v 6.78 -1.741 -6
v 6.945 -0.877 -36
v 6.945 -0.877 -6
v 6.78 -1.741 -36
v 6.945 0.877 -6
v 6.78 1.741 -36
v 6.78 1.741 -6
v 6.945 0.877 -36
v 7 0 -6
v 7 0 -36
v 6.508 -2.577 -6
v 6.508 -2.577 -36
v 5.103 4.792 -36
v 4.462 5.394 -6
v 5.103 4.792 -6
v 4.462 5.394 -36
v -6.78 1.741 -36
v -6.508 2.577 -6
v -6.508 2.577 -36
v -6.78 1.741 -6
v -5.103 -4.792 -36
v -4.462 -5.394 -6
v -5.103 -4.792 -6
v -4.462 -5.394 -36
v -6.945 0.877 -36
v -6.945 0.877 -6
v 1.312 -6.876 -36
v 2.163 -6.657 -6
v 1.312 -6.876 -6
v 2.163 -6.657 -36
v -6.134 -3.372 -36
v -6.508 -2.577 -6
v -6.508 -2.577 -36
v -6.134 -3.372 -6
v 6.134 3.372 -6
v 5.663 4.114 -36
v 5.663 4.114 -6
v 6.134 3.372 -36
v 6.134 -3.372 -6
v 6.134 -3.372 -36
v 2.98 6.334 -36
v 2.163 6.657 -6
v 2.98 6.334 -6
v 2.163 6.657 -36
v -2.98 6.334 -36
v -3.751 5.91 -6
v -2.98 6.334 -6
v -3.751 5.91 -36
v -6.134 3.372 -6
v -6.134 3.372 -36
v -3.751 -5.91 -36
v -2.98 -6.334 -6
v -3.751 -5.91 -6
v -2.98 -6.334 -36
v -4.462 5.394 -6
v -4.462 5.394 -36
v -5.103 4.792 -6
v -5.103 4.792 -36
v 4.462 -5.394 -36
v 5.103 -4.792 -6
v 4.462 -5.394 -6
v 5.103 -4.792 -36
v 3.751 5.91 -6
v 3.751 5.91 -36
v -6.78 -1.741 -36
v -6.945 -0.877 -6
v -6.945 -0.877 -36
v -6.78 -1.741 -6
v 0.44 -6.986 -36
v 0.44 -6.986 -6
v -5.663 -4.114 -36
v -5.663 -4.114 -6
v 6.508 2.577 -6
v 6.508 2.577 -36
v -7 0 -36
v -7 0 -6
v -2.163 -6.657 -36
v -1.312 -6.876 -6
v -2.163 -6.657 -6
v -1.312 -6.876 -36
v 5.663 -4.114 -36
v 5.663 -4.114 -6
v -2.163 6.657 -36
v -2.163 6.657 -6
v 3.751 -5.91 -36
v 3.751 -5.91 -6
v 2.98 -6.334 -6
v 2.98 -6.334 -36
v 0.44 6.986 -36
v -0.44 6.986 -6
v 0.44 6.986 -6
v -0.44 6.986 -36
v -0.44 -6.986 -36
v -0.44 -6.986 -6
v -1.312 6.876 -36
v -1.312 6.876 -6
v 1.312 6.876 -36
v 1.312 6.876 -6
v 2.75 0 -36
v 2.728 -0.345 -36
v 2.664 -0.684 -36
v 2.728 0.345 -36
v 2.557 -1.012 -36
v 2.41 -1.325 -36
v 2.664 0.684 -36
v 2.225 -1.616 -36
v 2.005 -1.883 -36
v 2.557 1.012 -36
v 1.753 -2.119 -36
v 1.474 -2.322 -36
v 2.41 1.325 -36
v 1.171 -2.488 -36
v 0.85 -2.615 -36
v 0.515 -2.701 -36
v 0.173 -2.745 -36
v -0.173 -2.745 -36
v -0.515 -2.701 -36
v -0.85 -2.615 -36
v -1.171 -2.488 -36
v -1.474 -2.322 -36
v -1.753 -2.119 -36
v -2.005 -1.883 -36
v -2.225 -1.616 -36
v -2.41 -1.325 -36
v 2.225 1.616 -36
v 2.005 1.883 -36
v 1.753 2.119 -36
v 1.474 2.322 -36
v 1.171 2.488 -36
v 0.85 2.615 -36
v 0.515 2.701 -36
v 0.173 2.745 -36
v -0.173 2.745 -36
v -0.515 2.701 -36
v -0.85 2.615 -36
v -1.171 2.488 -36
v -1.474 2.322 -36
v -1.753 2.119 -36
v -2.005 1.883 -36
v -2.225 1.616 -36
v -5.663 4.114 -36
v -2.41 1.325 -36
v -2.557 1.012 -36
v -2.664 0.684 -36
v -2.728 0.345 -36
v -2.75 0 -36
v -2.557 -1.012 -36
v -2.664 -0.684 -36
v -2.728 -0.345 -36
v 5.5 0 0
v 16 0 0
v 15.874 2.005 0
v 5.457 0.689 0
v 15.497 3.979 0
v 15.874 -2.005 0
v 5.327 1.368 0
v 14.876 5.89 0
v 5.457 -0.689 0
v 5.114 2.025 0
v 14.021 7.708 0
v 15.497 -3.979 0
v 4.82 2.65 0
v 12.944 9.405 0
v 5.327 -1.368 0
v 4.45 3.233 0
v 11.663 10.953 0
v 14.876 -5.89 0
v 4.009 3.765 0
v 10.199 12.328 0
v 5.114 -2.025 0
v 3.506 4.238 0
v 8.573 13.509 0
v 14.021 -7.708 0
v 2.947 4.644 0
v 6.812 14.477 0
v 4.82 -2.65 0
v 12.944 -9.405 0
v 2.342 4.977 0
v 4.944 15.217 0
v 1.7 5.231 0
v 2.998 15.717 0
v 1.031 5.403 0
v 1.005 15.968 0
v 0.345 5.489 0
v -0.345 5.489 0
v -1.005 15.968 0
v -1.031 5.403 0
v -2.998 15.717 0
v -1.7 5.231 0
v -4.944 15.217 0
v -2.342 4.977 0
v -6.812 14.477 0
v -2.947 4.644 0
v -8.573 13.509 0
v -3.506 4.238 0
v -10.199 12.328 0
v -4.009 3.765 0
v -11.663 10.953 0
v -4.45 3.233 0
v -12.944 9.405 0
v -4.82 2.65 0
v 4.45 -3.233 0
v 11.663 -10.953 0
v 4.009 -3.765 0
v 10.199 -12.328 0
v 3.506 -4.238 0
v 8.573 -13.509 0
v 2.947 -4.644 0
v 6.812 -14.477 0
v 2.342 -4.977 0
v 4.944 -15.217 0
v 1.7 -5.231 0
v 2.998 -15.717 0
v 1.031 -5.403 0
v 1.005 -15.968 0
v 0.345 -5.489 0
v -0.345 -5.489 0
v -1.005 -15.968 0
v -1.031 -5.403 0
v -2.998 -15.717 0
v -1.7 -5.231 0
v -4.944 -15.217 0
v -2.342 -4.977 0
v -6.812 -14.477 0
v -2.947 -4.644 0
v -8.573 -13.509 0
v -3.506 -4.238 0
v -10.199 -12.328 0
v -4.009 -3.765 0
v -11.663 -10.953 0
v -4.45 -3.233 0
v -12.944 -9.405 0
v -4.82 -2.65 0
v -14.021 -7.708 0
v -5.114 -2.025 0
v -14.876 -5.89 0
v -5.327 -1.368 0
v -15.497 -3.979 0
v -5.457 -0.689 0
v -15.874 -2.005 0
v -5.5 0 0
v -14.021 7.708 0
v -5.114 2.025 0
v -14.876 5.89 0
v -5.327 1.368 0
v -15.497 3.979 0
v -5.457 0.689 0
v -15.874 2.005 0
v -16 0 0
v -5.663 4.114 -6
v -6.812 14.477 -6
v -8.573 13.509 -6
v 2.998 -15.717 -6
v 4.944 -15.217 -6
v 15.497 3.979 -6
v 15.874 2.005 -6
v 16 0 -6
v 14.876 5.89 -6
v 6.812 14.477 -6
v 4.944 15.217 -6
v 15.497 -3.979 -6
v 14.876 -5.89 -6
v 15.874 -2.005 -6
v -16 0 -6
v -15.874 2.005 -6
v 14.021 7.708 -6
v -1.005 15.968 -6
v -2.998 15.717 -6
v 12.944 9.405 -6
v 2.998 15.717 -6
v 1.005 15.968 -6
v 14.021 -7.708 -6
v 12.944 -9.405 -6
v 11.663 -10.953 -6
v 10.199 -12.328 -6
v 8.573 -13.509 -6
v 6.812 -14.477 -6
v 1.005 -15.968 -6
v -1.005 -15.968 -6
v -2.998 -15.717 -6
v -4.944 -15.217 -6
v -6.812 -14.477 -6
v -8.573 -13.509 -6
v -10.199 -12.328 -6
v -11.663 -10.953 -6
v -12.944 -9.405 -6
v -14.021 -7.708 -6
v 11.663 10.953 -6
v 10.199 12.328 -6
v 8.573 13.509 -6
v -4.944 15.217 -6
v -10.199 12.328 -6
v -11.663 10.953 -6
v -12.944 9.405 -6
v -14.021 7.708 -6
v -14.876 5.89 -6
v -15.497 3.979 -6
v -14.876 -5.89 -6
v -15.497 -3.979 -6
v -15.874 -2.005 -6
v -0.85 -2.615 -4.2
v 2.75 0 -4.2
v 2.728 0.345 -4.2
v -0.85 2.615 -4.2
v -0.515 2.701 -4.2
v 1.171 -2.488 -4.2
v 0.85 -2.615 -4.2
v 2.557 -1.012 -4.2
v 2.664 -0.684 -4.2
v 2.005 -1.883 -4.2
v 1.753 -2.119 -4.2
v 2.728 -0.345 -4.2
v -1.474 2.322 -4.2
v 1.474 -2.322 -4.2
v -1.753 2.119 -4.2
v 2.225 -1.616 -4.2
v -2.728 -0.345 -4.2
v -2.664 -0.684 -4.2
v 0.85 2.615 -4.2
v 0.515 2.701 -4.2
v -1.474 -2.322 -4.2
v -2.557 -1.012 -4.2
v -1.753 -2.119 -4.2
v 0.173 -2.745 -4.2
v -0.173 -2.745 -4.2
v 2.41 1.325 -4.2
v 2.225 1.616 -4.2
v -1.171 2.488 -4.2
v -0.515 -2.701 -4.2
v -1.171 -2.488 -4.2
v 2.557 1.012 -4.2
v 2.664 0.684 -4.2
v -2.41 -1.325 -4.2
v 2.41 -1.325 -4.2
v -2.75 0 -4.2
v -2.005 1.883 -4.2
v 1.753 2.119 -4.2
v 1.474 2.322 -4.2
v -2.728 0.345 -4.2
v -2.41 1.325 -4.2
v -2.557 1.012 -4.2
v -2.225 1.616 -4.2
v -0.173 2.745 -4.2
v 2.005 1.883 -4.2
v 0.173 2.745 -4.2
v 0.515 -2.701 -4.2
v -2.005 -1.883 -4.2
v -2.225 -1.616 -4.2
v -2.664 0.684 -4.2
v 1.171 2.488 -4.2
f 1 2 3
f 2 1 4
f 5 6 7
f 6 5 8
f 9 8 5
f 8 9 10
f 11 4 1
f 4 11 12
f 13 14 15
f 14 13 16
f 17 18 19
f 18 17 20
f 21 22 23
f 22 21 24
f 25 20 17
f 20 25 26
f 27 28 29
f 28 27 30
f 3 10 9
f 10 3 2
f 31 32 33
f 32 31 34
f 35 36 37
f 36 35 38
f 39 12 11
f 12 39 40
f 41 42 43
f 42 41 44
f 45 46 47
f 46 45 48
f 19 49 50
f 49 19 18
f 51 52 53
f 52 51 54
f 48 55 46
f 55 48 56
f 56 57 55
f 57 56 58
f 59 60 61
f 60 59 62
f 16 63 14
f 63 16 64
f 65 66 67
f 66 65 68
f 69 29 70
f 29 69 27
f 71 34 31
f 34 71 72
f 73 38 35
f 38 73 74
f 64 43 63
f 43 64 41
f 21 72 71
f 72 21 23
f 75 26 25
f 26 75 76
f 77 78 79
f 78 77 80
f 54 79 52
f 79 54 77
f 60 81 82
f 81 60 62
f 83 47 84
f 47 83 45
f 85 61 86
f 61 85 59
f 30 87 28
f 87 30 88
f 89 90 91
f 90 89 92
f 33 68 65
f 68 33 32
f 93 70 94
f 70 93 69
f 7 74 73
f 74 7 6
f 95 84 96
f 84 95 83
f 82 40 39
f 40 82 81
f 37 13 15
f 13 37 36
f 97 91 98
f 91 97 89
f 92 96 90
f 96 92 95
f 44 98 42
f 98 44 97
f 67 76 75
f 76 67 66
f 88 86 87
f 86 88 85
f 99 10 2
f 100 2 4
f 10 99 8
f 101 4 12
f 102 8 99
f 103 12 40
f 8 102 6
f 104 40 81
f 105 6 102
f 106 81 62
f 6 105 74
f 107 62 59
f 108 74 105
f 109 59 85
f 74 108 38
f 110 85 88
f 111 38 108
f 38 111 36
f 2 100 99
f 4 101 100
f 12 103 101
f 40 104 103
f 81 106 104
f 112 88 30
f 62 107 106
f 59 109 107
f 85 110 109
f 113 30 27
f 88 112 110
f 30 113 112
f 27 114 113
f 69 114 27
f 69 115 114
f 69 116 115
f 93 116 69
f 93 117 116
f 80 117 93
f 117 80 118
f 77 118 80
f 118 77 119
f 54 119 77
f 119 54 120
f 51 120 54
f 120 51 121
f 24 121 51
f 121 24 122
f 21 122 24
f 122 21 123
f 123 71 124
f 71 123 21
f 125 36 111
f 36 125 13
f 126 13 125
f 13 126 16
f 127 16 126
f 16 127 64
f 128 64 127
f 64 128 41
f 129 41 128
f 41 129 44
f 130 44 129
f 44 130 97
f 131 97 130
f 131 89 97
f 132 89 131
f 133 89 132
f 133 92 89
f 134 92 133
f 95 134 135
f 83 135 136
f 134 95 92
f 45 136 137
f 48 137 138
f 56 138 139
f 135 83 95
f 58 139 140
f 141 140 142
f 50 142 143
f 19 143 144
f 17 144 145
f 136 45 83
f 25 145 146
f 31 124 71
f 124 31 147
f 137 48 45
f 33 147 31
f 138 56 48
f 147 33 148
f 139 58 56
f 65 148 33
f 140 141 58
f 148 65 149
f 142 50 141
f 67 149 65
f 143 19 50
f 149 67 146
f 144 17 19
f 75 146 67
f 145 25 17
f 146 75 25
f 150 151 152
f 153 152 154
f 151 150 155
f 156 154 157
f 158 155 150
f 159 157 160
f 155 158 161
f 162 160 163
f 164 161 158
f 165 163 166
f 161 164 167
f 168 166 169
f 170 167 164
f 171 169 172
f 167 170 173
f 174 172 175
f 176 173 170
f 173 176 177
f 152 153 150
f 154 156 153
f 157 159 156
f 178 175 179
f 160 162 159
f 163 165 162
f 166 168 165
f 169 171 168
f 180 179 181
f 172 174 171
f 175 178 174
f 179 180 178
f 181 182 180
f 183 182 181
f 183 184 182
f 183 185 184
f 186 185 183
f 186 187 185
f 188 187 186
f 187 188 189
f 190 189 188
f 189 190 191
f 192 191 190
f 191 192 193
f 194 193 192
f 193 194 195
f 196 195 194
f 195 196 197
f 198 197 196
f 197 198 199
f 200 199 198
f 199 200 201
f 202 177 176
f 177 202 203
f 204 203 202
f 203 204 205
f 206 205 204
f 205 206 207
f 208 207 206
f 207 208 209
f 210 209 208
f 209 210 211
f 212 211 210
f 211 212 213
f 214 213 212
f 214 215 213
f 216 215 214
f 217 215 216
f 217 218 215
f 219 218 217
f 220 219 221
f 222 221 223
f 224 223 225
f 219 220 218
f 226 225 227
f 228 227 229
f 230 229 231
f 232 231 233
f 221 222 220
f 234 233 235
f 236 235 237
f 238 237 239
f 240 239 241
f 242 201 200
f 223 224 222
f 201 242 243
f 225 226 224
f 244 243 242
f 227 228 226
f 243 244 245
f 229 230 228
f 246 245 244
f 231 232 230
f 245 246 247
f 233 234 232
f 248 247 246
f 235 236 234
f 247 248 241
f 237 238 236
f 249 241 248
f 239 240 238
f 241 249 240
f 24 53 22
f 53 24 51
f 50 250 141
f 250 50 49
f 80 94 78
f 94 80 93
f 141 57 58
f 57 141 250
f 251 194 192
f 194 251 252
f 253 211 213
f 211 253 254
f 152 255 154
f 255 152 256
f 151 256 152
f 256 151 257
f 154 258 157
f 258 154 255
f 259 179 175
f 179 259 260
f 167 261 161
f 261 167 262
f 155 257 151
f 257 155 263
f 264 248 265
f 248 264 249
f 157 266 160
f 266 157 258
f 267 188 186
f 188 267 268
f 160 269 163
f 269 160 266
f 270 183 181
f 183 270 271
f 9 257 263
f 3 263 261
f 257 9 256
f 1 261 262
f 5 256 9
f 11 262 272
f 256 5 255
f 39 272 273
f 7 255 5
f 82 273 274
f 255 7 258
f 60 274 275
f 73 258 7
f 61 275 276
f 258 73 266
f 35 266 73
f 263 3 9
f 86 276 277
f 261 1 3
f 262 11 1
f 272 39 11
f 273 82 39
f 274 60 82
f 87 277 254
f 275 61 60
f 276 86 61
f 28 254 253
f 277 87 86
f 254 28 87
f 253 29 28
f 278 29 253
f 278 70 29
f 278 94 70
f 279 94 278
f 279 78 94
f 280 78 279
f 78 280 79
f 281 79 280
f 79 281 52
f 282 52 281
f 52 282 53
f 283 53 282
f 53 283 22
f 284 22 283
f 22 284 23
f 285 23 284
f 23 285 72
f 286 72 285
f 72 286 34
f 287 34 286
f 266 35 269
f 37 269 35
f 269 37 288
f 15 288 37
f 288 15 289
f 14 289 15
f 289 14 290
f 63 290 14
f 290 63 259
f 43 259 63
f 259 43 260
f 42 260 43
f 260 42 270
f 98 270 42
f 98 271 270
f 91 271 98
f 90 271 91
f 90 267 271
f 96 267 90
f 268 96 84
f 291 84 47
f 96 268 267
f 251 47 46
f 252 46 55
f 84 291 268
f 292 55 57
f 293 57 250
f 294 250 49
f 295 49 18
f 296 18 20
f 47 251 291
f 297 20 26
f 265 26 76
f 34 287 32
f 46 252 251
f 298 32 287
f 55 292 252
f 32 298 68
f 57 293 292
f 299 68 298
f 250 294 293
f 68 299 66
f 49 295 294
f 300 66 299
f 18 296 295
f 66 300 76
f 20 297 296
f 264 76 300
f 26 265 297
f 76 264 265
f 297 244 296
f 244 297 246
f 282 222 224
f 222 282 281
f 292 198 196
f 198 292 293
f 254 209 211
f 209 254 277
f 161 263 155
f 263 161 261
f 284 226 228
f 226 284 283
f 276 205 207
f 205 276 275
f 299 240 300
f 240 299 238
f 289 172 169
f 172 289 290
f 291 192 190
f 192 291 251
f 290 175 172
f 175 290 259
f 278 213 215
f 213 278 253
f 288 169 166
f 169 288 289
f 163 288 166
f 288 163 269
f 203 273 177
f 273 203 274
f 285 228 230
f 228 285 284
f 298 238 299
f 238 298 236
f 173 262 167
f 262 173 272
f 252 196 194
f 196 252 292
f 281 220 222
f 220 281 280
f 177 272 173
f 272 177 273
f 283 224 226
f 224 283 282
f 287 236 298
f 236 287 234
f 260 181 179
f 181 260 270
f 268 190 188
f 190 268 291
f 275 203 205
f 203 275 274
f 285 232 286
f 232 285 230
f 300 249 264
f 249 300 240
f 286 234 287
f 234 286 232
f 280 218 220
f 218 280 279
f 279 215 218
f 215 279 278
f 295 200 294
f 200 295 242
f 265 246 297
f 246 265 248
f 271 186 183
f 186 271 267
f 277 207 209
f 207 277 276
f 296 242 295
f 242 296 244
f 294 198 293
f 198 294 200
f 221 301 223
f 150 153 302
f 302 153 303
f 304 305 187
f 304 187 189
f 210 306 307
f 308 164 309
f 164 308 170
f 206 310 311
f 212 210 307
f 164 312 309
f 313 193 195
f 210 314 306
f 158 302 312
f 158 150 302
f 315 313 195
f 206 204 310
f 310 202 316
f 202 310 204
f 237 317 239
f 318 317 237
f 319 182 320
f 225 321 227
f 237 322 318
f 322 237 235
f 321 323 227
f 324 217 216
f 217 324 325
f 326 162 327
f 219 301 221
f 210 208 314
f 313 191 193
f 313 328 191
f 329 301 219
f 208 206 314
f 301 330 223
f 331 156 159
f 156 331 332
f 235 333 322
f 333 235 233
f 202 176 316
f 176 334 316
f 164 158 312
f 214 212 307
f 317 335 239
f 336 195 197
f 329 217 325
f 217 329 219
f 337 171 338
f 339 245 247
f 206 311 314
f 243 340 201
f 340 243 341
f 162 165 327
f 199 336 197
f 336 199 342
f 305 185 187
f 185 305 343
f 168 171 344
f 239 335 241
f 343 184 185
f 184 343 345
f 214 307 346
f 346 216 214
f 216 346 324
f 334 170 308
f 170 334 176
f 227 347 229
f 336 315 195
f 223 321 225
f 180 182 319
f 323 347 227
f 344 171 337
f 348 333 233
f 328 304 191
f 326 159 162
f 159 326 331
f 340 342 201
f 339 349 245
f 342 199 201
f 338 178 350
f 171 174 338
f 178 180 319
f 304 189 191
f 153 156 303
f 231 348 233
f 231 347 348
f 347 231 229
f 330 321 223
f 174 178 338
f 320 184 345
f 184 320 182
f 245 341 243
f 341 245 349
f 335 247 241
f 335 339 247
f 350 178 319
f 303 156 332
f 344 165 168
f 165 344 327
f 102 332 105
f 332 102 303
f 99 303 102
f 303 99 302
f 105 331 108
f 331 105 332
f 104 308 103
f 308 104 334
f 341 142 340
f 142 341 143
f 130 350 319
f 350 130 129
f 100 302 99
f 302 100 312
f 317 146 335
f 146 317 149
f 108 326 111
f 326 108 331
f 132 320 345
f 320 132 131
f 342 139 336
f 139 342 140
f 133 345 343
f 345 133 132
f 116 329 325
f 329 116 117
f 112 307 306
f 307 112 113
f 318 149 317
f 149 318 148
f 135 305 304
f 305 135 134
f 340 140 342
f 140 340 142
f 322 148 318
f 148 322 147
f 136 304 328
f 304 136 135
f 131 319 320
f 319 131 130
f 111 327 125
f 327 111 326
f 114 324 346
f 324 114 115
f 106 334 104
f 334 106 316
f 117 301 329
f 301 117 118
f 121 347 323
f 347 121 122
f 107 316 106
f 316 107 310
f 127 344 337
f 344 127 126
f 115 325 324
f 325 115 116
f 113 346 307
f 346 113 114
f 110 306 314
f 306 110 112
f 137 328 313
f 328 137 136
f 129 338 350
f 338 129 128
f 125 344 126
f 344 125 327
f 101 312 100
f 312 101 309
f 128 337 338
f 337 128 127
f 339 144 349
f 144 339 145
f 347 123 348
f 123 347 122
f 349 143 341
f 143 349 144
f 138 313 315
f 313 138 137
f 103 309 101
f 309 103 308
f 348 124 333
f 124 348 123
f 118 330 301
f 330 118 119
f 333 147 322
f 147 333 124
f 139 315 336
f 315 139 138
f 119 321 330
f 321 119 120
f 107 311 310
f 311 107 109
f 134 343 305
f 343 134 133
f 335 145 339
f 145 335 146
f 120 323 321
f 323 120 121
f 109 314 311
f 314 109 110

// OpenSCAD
$fn = 50;


difference() {
	union() {
		translate(v = [0, 0, -36.0000000000]) {
			cylinder(h = 36, r = 7.0000000000);
		}
		translate(v = [0, 0, -6.0000000000]) {
			cylinder(h = 6, r = 16.0000000000);
		}
	}
	union() {
		translate(v = [0, 0, 0]) {
			rotate(a = [0, 0, 0]) {
				difference() {
					union() {
						#translate(v = [0, 0, -36.0000000000]) {
							cylinder(h = 36, r = 2.2500000000);
						}
						#translate(v = [0, 0, -4.2000000000]) {
							cylinder(h = 4.2000000000, r1 = 2.7500000000, r2 = 5.5000000000);
						}
						#translate(v = [0, 0, -36.0000000000]) {
							cylinder(h = 36, r = 2.7500000000);
						}
						#translate(v = [0, 0, -36.0000000000]) {
							cylinder(h = 36, r = 2.2500000000);
						}
					}
					union();
				}
			}
		}
	}
}
